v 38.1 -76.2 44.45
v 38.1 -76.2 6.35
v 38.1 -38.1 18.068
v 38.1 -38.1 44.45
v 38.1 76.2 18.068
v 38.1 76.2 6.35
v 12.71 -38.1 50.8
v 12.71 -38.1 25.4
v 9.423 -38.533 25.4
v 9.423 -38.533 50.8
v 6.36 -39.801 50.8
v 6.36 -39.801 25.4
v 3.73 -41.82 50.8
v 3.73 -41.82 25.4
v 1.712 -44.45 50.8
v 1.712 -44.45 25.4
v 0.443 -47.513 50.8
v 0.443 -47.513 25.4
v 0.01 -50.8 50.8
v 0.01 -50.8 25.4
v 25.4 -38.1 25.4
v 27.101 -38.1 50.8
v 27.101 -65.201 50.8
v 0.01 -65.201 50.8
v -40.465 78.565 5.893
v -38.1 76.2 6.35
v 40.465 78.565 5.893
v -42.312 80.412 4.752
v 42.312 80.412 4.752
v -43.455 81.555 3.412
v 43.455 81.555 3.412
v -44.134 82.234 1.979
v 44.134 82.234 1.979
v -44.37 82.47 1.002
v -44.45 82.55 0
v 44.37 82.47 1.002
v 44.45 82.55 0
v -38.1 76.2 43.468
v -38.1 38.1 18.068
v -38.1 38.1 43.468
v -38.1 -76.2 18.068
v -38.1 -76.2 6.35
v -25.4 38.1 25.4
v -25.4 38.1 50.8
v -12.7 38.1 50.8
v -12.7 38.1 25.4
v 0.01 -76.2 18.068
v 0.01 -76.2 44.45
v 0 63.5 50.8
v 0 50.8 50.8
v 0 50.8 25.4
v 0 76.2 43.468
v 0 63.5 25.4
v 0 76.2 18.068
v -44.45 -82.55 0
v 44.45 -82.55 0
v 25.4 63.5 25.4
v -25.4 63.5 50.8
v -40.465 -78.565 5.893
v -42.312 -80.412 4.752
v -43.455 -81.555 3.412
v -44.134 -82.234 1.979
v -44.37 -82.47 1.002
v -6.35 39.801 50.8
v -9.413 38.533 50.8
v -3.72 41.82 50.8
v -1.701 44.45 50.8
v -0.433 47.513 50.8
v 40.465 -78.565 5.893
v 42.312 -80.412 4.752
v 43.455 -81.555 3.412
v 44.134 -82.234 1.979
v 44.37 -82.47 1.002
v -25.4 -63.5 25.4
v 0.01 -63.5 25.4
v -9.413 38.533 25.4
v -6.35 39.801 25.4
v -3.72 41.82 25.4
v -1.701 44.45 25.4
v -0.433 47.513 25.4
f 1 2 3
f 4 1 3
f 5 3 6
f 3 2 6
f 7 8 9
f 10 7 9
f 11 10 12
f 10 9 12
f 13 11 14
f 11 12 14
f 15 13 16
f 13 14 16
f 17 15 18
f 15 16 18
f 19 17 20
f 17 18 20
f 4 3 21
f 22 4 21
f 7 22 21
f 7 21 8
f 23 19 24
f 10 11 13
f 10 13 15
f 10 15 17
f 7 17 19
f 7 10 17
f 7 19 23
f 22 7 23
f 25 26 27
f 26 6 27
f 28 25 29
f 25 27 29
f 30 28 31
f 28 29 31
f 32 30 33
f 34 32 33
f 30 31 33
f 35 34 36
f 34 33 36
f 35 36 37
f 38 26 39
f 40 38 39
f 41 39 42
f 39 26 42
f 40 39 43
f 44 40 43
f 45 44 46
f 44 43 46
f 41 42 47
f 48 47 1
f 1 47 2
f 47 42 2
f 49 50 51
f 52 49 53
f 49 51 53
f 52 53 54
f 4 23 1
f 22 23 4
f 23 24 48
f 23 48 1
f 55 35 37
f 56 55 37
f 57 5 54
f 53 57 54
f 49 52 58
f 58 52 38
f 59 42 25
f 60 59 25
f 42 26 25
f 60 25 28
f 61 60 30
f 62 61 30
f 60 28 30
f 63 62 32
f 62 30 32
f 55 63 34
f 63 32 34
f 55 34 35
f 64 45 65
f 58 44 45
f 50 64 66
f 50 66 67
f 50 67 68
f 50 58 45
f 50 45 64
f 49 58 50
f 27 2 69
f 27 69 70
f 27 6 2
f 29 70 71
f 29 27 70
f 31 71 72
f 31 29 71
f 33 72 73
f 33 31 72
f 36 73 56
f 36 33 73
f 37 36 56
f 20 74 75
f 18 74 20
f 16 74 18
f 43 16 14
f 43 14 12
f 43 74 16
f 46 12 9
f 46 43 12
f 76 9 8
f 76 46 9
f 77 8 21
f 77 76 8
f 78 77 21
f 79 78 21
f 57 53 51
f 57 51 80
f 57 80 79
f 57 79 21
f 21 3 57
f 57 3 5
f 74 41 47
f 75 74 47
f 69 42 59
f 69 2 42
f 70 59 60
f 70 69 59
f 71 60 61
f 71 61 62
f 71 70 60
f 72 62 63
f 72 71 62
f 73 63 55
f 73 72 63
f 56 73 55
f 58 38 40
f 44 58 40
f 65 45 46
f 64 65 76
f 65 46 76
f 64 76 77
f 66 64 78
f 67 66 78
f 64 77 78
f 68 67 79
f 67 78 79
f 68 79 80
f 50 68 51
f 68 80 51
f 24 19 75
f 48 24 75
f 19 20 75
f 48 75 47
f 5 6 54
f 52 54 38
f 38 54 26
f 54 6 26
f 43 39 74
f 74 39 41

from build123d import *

# Parameters (mm, degrees)
F1_DEPTH = 25.4
F0_W     = 88.9
F0_H     = 165.1
F2_DEPTH = 6.35
F3_DEPTH = 50.8
F4_R     = 6.34999
F5_SIZE2 = 7.3323484187
F5_SIZE  = 12.7
F6_SIZE2 = 7.3323484187
F6_SIZE  = 12.7
F7_SIZE2 = 10.9985226281
F7_SIZE  = 6.35


# Not quite as in the source:
# - a fillet or chamfer is up to 0.001 mm smaller than in the source, because OpenCascade refuses the exact size


with BuildPart() as f1:
    # F0 (on Top) → F1 (new body)
    with BuildSketch(Plane.XY):
        with BuildLine():
            Line((38.1, -38.1), (38.1, 76.2))
            Line((38.1, 76.2), (0, 76.2))
            Line((0, 76.2), (0, 50.8))
            ThreePointArc((0, 50.8), (-3.7197438789, 41.8197438789), (-12.7, 38.1))
            Line((-12.7, 38.1), (-38.1, 38.1))
            Line((-38.1, 38.1), (-38.1, -76.2))
            Line((-38.1, -76.2), (0.0100879326, -76.2))
            Line((0.0100879326, -76.2), (0.0100879326, -50.8))
            ThreePointArc((0.0100879326, -50.8), (3.7298318116, -41.8197438789), (12.7100879326, -38.1))
            Line((12.7100879326, -38.1), (38.1, -38.1))
        make_face()
    extrude(amount=F1_DEPTH)

    # F0 (on Top) → F2 (join)
    with BuildSketch(Plane.XY):
        Rectangle(F0_W, F0_H)
        Polygon((0, 76.2), (38.1, 76.2), (38.1, -38.1), (38.1, -76.2), (0.0100879326, -76.2), (-38.1, -76.2), (-38.1, 38.1), (-38.1, 76.2), align=None, mode=Mode.SUBTRACT)
    extrude(amount=F2_DEPTH)

    # F0 (on Top) → F3 (join)
    with BuildSketch(Plane.XY):
        with BuildLine():
            Line((0, 50.8), (0, 76.2))
            Line((0, 76.2), (-38.1, 76.2))
            Line((-38.1, 76.2), (-38.1, 38.1))
            Line((-38.1, 38.1), (-12.7, 38.1))
            ThreePointArc((-12.7, 38.1), (-3.7197438789, 41.8197438789), (0, 50.8))
        make_face()
        with BuildLine():
            Line((38.1, -76.2), (38.1, -38.1))
            Line((38.1, -38.1), (12.7100879326, -38.1))
            ThreePointArc((12.7100879326, -38.1), (3.7298318116, -41.8197438789), (0.0100879326, -50.8))
            Line((0.0100879326, -50.8), (0.0100879326, -76.2))
            Line((0.0100879326, -76.2), (38.1, -76.2))
        make_face()
    extrude(amount=F3_DEPTH)

    # F4 (radius 6.35 in the source; OpenCascade refuses exactly that, so slightly less here)
    f4_edges = [f1.edges().sort_by_distance(p)[0] for p in [
        (44.45, 0, 6.35),
        (0, 82.55, 6.35),
        (-44.45, 0, 6.35),
        (0, -82.55, 6.35),
    ]]
    fillet(f4_edges, radius=F4_R)

    # F5
    f5_edges = [f1.edges().sort_by_distance(p)[0] for p in [
        (-38.1, -19.05, 25.4),
        (-19.044956, -76.2, 25.4),
        (19.05, 76.2, 25.4),
        (38.1, 19.05, 25.4),
    ]]
    f5_side = f1.faces().sort_by_distance((4e-05, -0.002502, 25.4))[0]
    chamfer(f5_edges, length=F5_SIZE, length2=F5_SIZE2, reference=f5_side)

    # F6
    f6_edges = [f1.edges().sort_by_distance(p)[0] for p in [
        (-38.1, 57.15, 50.8),
        (-19.05, 76.2, 50.8),
    ]]
    f6_side = f1.faces().sort_by_distance((-19.446042, 57.546042, 50.8))[0]
    chamfer(f6_edges, length=F6_SIZE, length2=F6_SIZE2, reference=f6_side)

    # F7
    f7_edges = [f1.edges().sort_by_distance(p)[0] for p in [
        (38.1, -57.15, 50.8),
        (19.055044, -76.2, 50.8),
    ]]
    chamfer(f7_edges, length=F7_SIZE, length2=F7_SIZE2)


solid = f1.part
